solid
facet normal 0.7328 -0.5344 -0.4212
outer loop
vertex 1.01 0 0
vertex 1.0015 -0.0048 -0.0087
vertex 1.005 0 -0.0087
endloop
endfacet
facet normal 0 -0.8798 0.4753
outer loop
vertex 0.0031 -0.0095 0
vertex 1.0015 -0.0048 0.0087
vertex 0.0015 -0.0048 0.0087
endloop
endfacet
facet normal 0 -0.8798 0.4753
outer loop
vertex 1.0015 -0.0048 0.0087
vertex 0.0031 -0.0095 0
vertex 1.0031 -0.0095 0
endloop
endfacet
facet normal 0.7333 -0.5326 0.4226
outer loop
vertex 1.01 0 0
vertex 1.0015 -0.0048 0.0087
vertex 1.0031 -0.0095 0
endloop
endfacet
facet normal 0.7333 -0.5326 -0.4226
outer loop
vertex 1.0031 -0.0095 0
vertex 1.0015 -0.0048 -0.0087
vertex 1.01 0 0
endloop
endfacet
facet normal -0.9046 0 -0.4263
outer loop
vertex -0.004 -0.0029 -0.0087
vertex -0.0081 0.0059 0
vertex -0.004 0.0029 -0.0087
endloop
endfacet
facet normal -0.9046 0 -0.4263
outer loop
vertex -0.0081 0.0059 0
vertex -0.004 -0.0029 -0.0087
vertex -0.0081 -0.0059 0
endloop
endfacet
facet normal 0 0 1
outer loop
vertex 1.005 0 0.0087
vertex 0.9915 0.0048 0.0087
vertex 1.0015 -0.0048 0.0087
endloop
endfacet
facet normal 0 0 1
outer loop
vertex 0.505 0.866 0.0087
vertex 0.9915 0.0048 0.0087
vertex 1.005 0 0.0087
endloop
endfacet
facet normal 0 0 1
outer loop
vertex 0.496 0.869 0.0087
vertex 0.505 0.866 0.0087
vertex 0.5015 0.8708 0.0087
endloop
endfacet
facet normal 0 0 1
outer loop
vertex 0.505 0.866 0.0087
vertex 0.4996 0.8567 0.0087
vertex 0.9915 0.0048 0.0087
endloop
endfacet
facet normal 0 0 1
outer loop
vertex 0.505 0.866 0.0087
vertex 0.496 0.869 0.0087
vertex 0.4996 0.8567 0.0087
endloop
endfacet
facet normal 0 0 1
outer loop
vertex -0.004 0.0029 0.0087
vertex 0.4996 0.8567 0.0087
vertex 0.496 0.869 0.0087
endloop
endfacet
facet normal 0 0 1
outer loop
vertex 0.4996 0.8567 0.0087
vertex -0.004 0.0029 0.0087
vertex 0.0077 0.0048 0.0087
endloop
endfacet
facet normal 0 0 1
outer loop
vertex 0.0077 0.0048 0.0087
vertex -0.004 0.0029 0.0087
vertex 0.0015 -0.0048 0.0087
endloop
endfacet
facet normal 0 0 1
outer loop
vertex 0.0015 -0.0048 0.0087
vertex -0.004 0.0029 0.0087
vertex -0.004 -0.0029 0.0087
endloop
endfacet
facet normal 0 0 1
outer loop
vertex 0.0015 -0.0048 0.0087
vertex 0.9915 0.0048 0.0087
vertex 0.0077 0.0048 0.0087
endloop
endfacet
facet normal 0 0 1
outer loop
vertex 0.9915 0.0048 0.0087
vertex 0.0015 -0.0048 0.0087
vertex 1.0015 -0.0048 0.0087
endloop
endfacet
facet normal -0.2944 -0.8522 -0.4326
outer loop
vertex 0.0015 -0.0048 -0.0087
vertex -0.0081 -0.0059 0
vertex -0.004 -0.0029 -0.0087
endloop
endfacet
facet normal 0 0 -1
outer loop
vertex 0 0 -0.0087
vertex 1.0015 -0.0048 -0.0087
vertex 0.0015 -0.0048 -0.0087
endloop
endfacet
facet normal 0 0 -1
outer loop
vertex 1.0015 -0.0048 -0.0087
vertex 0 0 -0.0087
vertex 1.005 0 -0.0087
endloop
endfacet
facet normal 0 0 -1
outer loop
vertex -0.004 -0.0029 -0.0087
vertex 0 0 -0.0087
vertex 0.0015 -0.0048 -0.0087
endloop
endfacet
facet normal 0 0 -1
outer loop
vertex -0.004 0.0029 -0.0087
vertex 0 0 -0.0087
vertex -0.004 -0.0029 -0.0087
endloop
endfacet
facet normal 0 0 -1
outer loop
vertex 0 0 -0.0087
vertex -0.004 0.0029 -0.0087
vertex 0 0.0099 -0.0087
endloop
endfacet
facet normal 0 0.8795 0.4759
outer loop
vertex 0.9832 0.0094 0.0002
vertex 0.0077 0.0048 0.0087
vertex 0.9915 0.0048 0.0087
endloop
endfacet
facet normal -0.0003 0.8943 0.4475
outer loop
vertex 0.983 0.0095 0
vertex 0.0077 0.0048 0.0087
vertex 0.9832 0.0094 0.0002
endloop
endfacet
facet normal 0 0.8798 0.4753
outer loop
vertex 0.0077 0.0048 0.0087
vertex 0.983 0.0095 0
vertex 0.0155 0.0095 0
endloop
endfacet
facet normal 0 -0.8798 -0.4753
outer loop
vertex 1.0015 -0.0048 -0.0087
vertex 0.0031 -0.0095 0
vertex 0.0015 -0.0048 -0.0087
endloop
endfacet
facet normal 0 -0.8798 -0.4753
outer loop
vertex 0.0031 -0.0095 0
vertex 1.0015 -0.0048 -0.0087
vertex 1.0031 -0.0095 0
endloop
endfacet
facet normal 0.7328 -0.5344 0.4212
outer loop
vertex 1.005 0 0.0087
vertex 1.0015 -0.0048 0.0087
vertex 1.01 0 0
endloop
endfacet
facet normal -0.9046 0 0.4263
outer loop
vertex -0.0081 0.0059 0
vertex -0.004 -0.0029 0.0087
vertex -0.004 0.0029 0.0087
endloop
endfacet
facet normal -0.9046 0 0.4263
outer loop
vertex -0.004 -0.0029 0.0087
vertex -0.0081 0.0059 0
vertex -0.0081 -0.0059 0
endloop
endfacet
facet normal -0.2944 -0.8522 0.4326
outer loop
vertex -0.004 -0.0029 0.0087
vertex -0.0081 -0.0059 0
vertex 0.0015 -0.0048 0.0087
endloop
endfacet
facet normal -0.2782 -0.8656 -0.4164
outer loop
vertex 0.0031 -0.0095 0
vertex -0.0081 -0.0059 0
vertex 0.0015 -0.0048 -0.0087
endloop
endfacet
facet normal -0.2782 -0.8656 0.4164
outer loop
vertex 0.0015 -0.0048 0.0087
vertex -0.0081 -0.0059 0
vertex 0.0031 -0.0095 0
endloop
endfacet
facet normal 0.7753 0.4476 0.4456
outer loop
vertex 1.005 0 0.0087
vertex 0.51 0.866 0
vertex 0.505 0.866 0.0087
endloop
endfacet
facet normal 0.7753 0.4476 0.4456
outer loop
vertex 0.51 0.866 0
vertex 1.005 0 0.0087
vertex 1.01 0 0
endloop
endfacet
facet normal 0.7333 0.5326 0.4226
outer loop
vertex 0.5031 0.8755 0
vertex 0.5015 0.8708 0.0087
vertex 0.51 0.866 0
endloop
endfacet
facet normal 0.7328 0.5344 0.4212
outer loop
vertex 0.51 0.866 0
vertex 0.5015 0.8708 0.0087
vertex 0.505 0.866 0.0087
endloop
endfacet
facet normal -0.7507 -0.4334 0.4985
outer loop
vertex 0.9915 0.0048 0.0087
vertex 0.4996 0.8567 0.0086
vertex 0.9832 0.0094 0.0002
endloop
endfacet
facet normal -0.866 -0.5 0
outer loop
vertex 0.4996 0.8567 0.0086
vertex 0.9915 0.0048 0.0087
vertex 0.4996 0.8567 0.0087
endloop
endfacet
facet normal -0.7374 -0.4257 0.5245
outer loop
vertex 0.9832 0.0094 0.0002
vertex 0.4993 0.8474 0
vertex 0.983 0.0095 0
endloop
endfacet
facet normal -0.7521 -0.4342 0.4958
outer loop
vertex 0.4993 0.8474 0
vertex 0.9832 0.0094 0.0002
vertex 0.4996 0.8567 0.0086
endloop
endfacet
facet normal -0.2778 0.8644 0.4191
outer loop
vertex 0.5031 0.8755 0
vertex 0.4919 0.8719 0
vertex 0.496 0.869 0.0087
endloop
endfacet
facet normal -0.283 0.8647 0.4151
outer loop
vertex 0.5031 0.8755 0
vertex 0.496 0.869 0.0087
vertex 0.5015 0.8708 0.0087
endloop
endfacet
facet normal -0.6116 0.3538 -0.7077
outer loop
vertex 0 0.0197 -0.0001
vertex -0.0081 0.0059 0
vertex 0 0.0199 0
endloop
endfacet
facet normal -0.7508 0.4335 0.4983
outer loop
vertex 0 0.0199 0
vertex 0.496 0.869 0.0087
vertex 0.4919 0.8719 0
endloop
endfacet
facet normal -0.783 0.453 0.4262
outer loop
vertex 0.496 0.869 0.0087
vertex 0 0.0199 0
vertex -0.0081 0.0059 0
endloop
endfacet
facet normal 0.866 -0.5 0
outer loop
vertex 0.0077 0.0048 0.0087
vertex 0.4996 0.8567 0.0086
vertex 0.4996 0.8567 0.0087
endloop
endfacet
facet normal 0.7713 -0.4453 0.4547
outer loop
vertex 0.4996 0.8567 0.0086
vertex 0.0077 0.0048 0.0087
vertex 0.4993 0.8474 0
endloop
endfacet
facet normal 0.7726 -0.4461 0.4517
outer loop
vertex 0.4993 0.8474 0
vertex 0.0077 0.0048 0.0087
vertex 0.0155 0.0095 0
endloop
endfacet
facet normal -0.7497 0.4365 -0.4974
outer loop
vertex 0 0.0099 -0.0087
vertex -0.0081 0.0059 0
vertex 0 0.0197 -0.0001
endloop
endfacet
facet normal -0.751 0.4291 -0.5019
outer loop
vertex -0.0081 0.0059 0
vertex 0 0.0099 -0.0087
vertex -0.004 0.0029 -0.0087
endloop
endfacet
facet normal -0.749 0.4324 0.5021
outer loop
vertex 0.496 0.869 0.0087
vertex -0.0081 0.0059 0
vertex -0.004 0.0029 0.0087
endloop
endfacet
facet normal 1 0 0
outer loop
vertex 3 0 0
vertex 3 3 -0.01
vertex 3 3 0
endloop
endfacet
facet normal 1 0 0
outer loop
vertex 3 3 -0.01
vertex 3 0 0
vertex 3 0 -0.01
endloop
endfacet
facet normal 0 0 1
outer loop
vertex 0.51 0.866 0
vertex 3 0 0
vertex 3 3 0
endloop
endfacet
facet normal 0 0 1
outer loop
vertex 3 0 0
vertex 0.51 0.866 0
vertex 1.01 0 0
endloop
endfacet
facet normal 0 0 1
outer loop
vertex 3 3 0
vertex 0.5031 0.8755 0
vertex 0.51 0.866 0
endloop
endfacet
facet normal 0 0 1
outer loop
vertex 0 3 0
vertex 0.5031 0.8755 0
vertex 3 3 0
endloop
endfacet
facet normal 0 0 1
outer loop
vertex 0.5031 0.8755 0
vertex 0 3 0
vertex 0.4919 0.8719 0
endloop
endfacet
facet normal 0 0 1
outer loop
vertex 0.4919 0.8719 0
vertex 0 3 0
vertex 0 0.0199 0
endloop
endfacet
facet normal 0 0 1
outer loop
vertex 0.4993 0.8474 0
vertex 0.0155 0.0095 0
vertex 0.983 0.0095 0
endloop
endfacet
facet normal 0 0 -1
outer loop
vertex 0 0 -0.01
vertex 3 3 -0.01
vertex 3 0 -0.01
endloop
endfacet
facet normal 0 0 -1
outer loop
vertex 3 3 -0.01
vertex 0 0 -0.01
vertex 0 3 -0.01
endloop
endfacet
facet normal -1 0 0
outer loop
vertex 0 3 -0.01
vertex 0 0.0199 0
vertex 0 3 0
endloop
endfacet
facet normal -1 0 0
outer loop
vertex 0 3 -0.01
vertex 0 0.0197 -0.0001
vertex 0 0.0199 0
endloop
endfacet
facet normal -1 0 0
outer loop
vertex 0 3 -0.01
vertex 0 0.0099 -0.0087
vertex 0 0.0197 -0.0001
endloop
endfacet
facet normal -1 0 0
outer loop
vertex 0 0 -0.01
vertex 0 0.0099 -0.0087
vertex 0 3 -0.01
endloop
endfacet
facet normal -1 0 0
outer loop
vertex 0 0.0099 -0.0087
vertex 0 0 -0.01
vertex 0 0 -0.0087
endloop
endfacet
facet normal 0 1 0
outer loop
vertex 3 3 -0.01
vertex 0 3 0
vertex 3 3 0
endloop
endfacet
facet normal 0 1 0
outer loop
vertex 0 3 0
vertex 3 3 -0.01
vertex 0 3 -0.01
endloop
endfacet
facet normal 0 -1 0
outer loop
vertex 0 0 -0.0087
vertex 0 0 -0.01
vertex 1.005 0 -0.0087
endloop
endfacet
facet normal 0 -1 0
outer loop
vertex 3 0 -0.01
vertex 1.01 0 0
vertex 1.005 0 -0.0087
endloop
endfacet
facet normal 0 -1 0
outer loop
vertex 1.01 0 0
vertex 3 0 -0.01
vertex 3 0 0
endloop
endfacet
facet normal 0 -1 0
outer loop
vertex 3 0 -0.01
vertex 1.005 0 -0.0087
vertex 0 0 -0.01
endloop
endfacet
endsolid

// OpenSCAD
hull(){
    translate([0.0, 0.0]) sphere(0.01);
    translate([1.0, 0.0]) sphere(0.01);
}
hull(){
    translate([1.0, 0.0]) sphere(0.01);
    translate([0.5, 0.8660254038]) sphere(0.01);
}
hull(){
    translate([0.5, 0.8660254038]) sphere(0.01);
    translate([0.0, 0.0]) sphere(0.01);
}
hull(){
    translate([0.0, 0.0]) sphere(0.01);
    translate([0.0, 0.0]) sphere(0.01);
}
translate([0,0,-0.01]) color([0.1,0.1,0.1]) cube([3,3,0.01]);
